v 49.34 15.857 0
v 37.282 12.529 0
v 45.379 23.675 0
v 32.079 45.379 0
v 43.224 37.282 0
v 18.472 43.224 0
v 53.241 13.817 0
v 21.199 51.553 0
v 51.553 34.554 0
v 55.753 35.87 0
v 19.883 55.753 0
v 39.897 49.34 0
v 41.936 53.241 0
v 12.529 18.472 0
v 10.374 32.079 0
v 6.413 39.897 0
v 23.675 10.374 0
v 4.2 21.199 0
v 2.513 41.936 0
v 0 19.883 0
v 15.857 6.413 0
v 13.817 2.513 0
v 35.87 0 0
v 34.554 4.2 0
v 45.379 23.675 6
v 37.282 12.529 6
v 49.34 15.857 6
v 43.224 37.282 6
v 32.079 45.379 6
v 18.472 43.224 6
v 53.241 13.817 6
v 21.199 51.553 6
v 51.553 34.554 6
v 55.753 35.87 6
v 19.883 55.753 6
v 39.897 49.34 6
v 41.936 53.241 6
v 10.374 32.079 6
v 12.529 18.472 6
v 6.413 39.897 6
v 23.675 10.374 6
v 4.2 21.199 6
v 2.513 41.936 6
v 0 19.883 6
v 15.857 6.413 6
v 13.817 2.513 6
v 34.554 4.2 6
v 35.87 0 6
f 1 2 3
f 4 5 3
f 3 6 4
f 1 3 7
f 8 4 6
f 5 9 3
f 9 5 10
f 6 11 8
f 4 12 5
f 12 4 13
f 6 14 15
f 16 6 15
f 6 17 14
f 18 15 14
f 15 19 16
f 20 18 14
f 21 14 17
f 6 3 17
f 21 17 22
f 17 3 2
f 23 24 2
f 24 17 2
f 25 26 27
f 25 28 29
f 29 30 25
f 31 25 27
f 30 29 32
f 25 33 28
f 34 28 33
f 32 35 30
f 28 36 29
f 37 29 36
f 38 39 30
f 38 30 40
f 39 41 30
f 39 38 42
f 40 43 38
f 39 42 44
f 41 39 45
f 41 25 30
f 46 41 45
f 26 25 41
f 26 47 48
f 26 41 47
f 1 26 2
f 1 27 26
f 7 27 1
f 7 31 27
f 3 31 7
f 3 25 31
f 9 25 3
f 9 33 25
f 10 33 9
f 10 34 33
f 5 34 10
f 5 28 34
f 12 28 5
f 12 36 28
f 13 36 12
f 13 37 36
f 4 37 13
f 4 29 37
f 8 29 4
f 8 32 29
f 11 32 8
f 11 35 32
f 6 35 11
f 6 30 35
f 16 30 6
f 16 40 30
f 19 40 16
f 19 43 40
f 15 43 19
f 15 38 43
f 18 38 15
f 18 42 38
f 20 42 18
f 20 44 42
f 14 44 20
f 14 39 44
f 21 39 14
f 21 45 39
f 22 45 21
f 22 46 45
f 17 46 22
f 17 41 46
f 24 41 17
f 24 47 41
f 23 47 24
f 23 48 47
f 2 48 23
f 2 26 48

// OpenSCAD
$fn = 32;

// ----------------------------------------------------------------------
// Fan rotor section: 8 blades, 18 mm hub radius, 11 mm blades
// ----------------------------------------------------------------------

// --- parameters (mm) ---
profile_height = 6;       // extrusion height
profile_points = 24;      // points of the closed outline

profile = [[45.379, 23.675], [51.553, 34.554], [55.753, 35.87], [43.224, 37.282], [39.897, 49.34], [41.936, 53.241], [32.079, 45.379], [21.199, 51.553], [19.883, 55.753], [18.472, 43.224], [6.413, 39.897], [2.513, 41.936], [10.374, 32.079], [4.2, 21.199], [0, 19.883], [12.529, 18.472], [15.857, 6.413], [13.817, 2.513], [23.675, 10.374], [34.554, 4.2], [35.87, 0], [37.282, 12.529], [49.34, 15.857], [53.241, 13.817]];  // single closed polygon, 24 points, counter clockwise

// --- the one profile operation ---
linear_extrude(height = profile_height) polygon(points = profile);
